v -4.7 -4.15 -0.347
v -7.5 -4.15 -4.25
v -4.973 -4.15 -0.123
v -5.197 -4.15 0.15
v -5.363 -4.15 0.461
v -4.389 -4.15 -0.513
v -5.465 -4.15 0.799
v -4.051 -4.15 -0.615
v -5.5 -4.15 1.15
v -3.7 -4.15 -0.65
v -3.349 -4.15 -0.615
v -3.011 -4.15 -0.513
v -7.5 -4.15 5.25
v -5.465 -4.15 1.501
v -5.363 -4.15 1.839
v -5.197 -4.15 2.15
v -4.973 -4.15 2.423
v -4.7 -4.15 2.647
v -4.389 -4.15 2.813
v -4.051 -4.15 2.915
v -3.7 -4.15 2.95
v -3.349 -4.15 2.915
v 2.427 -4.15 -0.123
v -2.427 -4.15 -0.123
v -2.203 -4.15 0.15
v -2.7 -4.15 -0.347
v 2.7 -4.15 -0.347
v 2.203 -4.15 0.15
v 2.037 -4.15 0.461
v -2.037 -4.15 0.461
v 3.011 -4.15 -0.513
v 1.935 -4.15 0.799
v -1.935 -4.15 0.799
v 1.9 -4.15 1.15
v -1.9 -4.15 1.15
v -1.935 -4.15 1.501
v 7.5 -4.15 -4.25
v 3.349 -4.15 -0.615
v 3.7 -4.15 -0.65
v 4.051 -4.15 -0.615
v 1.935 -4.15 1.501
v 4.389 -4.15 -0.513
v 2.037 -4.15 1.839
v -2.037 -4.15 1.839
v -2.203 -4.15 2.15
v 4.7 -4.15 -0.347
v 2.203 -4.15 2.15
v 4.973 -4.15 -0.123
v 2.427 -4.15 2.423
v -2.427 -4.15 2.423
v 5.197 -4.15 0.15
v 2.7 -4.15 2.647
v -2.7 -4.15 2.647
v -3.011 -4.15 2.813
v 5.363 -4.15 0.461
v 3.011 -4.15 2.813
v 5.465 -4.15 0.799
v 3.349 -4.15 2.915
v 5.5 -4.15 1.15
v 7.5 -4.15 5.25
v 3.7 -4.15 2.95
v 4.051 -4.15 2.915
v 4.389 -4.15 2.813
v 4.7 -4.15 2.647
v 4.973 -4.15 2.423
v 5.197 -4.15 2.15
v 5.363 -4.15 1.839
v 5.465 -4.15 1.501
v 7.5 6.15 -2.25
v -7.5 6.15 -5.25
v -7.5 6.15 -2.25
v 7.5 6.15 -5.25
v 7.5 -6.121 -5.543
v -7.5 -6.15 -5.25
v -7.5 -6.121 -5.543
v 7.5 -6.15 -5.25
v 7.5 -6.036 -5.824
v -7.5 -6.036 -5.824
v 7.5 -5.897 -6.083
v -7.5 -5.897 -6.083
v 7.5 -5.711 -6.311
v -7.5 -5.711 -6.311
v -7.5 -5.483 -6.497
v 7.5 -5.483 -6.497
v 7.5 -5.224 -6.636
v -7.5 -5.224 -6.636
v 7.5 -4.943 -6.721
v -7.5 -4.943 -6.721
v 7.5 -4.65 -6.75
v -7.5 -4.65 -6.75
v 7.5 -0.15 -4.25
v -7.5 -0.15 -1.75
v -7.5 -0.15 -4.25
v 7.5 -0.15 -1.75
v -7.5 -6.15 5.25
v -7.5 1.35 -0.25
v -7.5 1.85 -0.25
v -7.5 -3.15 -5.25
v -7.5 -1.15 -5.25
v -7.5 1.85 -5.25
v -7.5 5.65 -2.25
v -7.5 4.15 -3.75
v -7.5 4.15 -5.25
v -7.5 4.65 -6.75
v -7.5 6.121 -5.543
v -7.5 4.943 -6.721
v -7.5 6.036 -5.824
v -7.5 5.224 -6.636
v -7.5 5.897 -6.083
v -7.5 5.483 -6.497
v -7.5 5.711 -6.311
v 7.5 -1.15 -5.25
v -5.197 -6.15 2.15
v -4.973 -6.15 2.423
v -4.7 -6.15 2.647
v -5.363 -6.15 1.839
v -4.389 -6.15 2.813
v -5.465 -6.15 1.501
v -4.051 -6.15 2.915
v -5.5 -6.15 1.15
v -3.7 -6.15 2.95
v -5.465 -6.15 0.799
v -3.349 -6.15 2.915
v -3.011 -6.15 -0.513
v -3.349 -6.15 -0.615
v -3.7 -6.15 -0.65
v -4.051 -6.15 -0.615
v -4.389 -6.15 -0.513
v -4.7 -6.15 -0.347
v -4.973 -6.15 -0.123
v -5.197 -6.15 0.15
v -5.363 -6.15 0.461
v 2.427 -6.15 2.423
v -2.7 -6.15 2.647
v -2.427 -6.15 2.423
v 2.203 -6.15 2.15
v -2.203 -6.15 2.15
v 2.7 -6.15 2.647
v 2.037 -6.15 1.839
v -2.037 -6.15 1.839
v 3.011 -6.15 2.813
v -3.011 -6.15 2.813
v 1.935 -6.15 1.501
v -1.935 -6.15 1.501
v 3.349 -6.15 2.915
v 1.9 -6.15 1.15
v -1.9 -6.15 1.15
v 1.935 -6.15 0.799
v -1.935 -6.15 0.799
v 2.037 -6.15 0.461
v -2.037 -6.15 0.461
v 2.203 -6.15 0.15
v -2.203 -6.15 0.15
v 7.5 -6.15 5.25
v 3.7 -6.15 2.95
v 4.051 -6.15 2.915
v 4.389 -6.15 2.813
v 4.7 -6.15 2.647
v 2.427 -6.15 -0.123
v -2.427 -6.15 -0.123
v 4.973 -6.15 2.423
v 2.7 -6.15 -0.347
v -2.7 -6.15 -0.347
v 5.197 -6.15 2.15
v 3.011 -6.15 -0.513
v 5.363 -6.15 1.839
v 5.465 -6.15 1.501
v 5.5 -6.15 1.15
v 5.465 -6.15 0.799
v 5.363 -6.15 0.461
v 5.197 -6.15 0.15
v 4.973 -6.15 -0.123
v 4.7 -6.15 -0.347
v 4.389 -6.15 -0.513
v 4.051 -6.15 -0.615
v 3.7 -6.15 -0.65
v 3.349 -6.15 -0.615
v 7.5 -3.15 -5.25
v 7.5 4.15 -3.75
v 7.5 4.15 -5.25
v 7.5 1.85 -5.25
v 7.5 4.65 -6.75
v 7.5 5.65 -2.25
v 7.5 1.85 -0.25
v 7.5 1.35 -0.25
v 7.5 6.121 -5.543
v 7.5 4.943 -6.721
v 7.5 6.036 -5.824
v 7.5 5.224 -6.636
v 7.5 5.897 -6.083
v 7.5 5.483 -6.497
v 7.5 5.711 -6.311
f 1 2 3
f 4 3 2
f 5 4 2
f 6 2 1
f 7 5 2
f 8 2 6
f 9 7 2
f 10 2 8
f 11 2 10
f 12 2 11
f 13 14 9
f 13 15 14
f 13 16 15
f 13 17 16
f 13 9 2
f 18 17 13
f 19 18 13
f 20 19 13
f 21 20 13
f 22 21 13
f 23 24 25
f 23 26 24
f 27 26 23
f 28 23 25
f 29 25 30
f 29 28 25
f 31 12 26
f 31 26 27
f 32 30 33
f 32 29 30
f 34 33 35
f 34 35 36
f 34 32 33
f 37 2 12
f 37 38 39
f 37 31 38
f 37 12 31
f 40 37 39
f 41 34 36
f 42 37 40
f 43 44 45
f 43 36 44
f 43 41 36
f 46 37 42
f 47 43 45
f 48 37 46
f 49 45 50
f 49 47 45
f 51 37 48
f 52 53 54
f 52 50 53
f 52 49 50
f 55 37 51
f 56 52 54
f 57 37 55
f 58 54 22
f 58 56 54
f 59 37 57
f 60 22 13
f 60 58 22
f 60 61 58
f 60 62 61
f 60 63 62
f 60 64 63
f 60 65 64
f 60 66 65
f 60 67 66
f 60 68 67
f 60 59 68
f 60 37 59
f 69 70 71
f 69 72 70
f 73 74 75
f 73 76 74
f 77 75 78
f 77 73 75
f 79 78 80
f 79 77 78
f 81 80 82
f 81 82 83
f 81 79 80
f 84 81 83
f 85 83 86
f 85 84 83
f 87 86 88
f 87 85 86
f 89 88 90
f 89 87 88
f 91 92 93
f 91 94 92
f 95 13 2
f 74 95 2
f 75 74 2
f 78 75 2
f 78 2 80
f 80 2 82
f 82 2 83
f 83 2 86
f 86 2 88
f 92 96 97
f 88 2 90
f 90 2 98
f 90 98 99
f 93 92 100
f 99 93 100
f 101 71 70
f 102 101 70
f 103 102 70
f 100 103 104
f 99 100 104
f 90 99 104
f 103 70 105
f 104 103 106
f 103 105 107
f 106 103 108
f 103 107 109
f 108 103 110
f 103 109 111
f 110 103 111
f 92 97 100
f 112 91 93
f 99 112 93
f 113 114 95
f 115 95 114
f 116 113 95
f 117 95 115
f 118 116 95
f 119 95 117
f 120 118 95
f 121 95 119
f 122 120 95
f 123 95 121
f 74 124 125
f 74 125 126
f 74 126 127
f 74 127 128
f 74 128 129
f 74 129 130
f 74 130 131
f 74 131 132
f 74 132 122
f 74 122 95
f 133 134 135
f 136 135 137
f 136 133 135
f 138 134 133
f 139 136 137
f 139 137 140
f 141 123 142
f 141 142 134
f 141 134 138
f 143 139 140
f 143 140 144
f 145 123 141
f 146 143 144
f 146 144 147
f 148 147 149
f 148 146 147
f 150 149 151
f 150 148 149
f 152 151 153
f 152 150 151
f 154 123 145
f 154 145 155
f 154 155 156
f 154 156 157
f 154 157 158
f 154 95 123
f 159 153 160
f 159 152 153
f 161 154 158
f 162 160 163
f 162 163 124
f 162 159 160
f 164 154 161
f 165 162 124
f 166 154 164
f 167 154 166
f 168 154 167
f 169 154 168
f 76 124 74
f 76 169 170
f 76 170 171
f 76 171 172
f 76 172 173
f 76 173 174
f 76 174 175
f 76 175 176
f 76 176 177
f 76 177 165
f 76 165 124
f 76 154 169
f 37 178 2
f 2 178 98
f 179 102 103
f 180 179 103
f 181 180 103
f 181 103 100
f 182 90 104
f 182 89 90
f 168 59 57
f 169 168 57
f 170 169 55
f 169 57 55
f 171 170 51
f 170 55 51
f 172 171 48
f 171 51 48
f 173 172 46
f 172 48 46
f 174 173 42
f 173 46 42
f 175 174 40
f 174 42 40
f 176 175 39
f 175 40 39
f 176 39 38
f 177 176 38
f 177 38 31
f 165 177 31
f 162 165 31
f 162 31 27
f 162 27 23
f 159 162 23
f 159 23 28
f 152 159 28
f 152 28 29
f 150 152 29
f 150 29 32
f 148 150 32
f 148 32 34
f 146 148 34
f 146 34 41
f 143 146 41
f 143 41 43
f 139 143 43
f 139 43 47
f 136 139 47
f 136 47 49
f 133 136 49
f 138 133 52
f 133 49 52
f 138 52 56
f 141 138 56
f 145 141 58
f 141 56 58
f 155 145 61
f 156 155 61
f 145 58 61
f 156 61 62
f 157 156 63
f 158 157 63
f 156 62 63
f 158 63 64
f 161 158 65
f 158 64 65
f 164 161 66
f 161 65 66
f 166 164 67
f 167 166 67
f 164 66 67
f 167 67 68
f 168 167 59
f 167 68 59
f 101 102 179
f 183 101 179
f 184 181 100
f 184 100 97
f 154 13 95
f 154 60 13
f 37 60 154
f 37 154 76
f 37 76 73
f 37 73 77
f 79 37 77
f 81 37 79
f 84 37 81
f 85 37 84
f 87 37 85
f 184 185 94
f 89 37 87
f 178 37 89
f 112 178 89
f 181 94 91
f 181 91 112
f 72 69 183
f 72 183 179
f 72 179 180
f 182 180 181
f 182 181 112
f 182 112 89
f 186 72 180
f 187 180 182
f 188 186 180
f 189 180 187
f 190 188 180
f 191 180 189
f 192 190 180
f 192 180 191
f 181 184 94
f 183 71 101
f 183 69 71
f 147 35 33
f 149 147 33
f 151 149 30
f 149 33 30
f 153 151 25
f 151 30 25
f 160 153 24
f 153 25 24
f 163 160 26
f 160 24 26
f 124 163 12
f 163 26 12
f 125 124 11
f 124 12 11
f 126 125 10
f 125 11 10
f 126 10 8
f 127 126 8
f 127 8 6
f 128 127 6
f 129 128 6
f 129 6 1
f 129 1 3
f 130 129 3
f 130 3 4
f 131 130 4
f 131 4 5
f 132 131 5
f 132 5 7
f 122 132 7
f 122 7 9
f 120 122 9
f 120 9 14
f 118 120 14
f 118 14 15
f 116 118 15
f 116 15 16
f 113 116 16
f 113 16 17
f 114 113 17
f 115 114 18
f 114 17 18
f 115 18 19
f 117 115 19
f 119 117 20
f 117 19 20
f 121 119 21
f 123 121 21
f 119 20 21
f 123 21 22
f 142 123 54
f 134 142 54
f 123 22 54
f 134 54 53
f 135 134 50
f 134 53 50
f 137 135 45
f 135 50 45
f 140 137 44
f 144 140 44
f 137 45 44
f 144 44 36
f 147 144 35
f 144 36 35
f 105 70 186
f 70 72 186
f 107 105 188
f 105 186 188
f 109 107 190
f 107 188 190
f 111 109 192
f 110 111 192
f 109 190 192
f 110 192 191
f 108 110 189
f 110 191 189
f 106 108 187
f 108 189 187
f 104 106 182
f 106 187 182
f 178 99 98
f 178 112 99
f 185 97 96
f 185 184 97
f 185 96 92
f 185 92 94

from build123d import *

# Parameters (mm, degrees)
BOSS_EXTRUDE1_DEPTH     = 7.5
CHAMFER1_SIZE           = 1
SKETCH2_R               = 1.8
CUT_EXTRUDE1_DEPTH      = 3
CUT_EXTRUDE1_DEPTH_BACK = 3
FILLET1_R               = 1.5
CHAMFER2_SIZE           = 1.5


with BuildPart() as part:
    # Sketch1 → Boss-Extrude1 (new body, symmetric)
    with BuildSketch(Plane(origin=(0, 0, 0), x_dir=(0, 0, -1), z_dir=(1, 0, 0))):
        Polygon((-5.25, -4.15), (-5.25, -6.15), (6.75, -6.15), (6.75, 6.15), (2.25, 6.15), (2.25, 4.15), (5.25, 4.15), (5.25, 1.85), (0.25, 1.85), (0.25, -0.15), (5.25, -0.15), (5.25, -4.15), align=None)
    extrude(amount=BOSS_EXTRUDE1_DEPTH, both=True)

    # Chamfer1
    chamfer1_edges = [part.edges().sort_by_distance(p)[0] for p in [
        (0, -4.15, -5.25),
        (0, -0.15, -5.25),
    ]]
    chamfer(chamfer1_edges, length=CHAMFER1_SIZE)

    # Sketch2 → Cut-Extrude1 (cut, two sides)
    with BuildSketch(Plane(origin=(0, -4.15, 0), x_dir=(1, 0, 0), z_dir=(0, 1, 0))) as cut_extrude1_sk:
        with Locations((-3.7, -1.15)):
            Circle(SKETCH2_R)
        with Locations((3.7, -1.15)):
            Circle(SKETCH2_R)
    extrude(amount=CUT_EXTRUDE1_DEPTH, mode=Mode.SUBTRACT)
    extrude(cut_extrude1_sk.sketch, amount=-CUT_EXTRUDE1_DEPTH_BACK, mode=Mode.SUBTRACT)

    # Fillet1
    fillet1_edges = [part.edges().sort_by_distance(p)[0] for p in [
        (0, 6.15, -6.75),
        (0, -6.15, -6.75),
    ]]
    fillet(fillet1_edges, radius=FILLET1_R)

    # Chamfer2
    chamfer2_edges = [part.edges().sort_by_distance(p)[0] for p in [
        (0, 4.15, -2.25),
        (0, -0.15, -0.25),
    ]]
    chamfer(chamfer2_edges, length=CHAMFER2_SIZE)


solid = part.part
